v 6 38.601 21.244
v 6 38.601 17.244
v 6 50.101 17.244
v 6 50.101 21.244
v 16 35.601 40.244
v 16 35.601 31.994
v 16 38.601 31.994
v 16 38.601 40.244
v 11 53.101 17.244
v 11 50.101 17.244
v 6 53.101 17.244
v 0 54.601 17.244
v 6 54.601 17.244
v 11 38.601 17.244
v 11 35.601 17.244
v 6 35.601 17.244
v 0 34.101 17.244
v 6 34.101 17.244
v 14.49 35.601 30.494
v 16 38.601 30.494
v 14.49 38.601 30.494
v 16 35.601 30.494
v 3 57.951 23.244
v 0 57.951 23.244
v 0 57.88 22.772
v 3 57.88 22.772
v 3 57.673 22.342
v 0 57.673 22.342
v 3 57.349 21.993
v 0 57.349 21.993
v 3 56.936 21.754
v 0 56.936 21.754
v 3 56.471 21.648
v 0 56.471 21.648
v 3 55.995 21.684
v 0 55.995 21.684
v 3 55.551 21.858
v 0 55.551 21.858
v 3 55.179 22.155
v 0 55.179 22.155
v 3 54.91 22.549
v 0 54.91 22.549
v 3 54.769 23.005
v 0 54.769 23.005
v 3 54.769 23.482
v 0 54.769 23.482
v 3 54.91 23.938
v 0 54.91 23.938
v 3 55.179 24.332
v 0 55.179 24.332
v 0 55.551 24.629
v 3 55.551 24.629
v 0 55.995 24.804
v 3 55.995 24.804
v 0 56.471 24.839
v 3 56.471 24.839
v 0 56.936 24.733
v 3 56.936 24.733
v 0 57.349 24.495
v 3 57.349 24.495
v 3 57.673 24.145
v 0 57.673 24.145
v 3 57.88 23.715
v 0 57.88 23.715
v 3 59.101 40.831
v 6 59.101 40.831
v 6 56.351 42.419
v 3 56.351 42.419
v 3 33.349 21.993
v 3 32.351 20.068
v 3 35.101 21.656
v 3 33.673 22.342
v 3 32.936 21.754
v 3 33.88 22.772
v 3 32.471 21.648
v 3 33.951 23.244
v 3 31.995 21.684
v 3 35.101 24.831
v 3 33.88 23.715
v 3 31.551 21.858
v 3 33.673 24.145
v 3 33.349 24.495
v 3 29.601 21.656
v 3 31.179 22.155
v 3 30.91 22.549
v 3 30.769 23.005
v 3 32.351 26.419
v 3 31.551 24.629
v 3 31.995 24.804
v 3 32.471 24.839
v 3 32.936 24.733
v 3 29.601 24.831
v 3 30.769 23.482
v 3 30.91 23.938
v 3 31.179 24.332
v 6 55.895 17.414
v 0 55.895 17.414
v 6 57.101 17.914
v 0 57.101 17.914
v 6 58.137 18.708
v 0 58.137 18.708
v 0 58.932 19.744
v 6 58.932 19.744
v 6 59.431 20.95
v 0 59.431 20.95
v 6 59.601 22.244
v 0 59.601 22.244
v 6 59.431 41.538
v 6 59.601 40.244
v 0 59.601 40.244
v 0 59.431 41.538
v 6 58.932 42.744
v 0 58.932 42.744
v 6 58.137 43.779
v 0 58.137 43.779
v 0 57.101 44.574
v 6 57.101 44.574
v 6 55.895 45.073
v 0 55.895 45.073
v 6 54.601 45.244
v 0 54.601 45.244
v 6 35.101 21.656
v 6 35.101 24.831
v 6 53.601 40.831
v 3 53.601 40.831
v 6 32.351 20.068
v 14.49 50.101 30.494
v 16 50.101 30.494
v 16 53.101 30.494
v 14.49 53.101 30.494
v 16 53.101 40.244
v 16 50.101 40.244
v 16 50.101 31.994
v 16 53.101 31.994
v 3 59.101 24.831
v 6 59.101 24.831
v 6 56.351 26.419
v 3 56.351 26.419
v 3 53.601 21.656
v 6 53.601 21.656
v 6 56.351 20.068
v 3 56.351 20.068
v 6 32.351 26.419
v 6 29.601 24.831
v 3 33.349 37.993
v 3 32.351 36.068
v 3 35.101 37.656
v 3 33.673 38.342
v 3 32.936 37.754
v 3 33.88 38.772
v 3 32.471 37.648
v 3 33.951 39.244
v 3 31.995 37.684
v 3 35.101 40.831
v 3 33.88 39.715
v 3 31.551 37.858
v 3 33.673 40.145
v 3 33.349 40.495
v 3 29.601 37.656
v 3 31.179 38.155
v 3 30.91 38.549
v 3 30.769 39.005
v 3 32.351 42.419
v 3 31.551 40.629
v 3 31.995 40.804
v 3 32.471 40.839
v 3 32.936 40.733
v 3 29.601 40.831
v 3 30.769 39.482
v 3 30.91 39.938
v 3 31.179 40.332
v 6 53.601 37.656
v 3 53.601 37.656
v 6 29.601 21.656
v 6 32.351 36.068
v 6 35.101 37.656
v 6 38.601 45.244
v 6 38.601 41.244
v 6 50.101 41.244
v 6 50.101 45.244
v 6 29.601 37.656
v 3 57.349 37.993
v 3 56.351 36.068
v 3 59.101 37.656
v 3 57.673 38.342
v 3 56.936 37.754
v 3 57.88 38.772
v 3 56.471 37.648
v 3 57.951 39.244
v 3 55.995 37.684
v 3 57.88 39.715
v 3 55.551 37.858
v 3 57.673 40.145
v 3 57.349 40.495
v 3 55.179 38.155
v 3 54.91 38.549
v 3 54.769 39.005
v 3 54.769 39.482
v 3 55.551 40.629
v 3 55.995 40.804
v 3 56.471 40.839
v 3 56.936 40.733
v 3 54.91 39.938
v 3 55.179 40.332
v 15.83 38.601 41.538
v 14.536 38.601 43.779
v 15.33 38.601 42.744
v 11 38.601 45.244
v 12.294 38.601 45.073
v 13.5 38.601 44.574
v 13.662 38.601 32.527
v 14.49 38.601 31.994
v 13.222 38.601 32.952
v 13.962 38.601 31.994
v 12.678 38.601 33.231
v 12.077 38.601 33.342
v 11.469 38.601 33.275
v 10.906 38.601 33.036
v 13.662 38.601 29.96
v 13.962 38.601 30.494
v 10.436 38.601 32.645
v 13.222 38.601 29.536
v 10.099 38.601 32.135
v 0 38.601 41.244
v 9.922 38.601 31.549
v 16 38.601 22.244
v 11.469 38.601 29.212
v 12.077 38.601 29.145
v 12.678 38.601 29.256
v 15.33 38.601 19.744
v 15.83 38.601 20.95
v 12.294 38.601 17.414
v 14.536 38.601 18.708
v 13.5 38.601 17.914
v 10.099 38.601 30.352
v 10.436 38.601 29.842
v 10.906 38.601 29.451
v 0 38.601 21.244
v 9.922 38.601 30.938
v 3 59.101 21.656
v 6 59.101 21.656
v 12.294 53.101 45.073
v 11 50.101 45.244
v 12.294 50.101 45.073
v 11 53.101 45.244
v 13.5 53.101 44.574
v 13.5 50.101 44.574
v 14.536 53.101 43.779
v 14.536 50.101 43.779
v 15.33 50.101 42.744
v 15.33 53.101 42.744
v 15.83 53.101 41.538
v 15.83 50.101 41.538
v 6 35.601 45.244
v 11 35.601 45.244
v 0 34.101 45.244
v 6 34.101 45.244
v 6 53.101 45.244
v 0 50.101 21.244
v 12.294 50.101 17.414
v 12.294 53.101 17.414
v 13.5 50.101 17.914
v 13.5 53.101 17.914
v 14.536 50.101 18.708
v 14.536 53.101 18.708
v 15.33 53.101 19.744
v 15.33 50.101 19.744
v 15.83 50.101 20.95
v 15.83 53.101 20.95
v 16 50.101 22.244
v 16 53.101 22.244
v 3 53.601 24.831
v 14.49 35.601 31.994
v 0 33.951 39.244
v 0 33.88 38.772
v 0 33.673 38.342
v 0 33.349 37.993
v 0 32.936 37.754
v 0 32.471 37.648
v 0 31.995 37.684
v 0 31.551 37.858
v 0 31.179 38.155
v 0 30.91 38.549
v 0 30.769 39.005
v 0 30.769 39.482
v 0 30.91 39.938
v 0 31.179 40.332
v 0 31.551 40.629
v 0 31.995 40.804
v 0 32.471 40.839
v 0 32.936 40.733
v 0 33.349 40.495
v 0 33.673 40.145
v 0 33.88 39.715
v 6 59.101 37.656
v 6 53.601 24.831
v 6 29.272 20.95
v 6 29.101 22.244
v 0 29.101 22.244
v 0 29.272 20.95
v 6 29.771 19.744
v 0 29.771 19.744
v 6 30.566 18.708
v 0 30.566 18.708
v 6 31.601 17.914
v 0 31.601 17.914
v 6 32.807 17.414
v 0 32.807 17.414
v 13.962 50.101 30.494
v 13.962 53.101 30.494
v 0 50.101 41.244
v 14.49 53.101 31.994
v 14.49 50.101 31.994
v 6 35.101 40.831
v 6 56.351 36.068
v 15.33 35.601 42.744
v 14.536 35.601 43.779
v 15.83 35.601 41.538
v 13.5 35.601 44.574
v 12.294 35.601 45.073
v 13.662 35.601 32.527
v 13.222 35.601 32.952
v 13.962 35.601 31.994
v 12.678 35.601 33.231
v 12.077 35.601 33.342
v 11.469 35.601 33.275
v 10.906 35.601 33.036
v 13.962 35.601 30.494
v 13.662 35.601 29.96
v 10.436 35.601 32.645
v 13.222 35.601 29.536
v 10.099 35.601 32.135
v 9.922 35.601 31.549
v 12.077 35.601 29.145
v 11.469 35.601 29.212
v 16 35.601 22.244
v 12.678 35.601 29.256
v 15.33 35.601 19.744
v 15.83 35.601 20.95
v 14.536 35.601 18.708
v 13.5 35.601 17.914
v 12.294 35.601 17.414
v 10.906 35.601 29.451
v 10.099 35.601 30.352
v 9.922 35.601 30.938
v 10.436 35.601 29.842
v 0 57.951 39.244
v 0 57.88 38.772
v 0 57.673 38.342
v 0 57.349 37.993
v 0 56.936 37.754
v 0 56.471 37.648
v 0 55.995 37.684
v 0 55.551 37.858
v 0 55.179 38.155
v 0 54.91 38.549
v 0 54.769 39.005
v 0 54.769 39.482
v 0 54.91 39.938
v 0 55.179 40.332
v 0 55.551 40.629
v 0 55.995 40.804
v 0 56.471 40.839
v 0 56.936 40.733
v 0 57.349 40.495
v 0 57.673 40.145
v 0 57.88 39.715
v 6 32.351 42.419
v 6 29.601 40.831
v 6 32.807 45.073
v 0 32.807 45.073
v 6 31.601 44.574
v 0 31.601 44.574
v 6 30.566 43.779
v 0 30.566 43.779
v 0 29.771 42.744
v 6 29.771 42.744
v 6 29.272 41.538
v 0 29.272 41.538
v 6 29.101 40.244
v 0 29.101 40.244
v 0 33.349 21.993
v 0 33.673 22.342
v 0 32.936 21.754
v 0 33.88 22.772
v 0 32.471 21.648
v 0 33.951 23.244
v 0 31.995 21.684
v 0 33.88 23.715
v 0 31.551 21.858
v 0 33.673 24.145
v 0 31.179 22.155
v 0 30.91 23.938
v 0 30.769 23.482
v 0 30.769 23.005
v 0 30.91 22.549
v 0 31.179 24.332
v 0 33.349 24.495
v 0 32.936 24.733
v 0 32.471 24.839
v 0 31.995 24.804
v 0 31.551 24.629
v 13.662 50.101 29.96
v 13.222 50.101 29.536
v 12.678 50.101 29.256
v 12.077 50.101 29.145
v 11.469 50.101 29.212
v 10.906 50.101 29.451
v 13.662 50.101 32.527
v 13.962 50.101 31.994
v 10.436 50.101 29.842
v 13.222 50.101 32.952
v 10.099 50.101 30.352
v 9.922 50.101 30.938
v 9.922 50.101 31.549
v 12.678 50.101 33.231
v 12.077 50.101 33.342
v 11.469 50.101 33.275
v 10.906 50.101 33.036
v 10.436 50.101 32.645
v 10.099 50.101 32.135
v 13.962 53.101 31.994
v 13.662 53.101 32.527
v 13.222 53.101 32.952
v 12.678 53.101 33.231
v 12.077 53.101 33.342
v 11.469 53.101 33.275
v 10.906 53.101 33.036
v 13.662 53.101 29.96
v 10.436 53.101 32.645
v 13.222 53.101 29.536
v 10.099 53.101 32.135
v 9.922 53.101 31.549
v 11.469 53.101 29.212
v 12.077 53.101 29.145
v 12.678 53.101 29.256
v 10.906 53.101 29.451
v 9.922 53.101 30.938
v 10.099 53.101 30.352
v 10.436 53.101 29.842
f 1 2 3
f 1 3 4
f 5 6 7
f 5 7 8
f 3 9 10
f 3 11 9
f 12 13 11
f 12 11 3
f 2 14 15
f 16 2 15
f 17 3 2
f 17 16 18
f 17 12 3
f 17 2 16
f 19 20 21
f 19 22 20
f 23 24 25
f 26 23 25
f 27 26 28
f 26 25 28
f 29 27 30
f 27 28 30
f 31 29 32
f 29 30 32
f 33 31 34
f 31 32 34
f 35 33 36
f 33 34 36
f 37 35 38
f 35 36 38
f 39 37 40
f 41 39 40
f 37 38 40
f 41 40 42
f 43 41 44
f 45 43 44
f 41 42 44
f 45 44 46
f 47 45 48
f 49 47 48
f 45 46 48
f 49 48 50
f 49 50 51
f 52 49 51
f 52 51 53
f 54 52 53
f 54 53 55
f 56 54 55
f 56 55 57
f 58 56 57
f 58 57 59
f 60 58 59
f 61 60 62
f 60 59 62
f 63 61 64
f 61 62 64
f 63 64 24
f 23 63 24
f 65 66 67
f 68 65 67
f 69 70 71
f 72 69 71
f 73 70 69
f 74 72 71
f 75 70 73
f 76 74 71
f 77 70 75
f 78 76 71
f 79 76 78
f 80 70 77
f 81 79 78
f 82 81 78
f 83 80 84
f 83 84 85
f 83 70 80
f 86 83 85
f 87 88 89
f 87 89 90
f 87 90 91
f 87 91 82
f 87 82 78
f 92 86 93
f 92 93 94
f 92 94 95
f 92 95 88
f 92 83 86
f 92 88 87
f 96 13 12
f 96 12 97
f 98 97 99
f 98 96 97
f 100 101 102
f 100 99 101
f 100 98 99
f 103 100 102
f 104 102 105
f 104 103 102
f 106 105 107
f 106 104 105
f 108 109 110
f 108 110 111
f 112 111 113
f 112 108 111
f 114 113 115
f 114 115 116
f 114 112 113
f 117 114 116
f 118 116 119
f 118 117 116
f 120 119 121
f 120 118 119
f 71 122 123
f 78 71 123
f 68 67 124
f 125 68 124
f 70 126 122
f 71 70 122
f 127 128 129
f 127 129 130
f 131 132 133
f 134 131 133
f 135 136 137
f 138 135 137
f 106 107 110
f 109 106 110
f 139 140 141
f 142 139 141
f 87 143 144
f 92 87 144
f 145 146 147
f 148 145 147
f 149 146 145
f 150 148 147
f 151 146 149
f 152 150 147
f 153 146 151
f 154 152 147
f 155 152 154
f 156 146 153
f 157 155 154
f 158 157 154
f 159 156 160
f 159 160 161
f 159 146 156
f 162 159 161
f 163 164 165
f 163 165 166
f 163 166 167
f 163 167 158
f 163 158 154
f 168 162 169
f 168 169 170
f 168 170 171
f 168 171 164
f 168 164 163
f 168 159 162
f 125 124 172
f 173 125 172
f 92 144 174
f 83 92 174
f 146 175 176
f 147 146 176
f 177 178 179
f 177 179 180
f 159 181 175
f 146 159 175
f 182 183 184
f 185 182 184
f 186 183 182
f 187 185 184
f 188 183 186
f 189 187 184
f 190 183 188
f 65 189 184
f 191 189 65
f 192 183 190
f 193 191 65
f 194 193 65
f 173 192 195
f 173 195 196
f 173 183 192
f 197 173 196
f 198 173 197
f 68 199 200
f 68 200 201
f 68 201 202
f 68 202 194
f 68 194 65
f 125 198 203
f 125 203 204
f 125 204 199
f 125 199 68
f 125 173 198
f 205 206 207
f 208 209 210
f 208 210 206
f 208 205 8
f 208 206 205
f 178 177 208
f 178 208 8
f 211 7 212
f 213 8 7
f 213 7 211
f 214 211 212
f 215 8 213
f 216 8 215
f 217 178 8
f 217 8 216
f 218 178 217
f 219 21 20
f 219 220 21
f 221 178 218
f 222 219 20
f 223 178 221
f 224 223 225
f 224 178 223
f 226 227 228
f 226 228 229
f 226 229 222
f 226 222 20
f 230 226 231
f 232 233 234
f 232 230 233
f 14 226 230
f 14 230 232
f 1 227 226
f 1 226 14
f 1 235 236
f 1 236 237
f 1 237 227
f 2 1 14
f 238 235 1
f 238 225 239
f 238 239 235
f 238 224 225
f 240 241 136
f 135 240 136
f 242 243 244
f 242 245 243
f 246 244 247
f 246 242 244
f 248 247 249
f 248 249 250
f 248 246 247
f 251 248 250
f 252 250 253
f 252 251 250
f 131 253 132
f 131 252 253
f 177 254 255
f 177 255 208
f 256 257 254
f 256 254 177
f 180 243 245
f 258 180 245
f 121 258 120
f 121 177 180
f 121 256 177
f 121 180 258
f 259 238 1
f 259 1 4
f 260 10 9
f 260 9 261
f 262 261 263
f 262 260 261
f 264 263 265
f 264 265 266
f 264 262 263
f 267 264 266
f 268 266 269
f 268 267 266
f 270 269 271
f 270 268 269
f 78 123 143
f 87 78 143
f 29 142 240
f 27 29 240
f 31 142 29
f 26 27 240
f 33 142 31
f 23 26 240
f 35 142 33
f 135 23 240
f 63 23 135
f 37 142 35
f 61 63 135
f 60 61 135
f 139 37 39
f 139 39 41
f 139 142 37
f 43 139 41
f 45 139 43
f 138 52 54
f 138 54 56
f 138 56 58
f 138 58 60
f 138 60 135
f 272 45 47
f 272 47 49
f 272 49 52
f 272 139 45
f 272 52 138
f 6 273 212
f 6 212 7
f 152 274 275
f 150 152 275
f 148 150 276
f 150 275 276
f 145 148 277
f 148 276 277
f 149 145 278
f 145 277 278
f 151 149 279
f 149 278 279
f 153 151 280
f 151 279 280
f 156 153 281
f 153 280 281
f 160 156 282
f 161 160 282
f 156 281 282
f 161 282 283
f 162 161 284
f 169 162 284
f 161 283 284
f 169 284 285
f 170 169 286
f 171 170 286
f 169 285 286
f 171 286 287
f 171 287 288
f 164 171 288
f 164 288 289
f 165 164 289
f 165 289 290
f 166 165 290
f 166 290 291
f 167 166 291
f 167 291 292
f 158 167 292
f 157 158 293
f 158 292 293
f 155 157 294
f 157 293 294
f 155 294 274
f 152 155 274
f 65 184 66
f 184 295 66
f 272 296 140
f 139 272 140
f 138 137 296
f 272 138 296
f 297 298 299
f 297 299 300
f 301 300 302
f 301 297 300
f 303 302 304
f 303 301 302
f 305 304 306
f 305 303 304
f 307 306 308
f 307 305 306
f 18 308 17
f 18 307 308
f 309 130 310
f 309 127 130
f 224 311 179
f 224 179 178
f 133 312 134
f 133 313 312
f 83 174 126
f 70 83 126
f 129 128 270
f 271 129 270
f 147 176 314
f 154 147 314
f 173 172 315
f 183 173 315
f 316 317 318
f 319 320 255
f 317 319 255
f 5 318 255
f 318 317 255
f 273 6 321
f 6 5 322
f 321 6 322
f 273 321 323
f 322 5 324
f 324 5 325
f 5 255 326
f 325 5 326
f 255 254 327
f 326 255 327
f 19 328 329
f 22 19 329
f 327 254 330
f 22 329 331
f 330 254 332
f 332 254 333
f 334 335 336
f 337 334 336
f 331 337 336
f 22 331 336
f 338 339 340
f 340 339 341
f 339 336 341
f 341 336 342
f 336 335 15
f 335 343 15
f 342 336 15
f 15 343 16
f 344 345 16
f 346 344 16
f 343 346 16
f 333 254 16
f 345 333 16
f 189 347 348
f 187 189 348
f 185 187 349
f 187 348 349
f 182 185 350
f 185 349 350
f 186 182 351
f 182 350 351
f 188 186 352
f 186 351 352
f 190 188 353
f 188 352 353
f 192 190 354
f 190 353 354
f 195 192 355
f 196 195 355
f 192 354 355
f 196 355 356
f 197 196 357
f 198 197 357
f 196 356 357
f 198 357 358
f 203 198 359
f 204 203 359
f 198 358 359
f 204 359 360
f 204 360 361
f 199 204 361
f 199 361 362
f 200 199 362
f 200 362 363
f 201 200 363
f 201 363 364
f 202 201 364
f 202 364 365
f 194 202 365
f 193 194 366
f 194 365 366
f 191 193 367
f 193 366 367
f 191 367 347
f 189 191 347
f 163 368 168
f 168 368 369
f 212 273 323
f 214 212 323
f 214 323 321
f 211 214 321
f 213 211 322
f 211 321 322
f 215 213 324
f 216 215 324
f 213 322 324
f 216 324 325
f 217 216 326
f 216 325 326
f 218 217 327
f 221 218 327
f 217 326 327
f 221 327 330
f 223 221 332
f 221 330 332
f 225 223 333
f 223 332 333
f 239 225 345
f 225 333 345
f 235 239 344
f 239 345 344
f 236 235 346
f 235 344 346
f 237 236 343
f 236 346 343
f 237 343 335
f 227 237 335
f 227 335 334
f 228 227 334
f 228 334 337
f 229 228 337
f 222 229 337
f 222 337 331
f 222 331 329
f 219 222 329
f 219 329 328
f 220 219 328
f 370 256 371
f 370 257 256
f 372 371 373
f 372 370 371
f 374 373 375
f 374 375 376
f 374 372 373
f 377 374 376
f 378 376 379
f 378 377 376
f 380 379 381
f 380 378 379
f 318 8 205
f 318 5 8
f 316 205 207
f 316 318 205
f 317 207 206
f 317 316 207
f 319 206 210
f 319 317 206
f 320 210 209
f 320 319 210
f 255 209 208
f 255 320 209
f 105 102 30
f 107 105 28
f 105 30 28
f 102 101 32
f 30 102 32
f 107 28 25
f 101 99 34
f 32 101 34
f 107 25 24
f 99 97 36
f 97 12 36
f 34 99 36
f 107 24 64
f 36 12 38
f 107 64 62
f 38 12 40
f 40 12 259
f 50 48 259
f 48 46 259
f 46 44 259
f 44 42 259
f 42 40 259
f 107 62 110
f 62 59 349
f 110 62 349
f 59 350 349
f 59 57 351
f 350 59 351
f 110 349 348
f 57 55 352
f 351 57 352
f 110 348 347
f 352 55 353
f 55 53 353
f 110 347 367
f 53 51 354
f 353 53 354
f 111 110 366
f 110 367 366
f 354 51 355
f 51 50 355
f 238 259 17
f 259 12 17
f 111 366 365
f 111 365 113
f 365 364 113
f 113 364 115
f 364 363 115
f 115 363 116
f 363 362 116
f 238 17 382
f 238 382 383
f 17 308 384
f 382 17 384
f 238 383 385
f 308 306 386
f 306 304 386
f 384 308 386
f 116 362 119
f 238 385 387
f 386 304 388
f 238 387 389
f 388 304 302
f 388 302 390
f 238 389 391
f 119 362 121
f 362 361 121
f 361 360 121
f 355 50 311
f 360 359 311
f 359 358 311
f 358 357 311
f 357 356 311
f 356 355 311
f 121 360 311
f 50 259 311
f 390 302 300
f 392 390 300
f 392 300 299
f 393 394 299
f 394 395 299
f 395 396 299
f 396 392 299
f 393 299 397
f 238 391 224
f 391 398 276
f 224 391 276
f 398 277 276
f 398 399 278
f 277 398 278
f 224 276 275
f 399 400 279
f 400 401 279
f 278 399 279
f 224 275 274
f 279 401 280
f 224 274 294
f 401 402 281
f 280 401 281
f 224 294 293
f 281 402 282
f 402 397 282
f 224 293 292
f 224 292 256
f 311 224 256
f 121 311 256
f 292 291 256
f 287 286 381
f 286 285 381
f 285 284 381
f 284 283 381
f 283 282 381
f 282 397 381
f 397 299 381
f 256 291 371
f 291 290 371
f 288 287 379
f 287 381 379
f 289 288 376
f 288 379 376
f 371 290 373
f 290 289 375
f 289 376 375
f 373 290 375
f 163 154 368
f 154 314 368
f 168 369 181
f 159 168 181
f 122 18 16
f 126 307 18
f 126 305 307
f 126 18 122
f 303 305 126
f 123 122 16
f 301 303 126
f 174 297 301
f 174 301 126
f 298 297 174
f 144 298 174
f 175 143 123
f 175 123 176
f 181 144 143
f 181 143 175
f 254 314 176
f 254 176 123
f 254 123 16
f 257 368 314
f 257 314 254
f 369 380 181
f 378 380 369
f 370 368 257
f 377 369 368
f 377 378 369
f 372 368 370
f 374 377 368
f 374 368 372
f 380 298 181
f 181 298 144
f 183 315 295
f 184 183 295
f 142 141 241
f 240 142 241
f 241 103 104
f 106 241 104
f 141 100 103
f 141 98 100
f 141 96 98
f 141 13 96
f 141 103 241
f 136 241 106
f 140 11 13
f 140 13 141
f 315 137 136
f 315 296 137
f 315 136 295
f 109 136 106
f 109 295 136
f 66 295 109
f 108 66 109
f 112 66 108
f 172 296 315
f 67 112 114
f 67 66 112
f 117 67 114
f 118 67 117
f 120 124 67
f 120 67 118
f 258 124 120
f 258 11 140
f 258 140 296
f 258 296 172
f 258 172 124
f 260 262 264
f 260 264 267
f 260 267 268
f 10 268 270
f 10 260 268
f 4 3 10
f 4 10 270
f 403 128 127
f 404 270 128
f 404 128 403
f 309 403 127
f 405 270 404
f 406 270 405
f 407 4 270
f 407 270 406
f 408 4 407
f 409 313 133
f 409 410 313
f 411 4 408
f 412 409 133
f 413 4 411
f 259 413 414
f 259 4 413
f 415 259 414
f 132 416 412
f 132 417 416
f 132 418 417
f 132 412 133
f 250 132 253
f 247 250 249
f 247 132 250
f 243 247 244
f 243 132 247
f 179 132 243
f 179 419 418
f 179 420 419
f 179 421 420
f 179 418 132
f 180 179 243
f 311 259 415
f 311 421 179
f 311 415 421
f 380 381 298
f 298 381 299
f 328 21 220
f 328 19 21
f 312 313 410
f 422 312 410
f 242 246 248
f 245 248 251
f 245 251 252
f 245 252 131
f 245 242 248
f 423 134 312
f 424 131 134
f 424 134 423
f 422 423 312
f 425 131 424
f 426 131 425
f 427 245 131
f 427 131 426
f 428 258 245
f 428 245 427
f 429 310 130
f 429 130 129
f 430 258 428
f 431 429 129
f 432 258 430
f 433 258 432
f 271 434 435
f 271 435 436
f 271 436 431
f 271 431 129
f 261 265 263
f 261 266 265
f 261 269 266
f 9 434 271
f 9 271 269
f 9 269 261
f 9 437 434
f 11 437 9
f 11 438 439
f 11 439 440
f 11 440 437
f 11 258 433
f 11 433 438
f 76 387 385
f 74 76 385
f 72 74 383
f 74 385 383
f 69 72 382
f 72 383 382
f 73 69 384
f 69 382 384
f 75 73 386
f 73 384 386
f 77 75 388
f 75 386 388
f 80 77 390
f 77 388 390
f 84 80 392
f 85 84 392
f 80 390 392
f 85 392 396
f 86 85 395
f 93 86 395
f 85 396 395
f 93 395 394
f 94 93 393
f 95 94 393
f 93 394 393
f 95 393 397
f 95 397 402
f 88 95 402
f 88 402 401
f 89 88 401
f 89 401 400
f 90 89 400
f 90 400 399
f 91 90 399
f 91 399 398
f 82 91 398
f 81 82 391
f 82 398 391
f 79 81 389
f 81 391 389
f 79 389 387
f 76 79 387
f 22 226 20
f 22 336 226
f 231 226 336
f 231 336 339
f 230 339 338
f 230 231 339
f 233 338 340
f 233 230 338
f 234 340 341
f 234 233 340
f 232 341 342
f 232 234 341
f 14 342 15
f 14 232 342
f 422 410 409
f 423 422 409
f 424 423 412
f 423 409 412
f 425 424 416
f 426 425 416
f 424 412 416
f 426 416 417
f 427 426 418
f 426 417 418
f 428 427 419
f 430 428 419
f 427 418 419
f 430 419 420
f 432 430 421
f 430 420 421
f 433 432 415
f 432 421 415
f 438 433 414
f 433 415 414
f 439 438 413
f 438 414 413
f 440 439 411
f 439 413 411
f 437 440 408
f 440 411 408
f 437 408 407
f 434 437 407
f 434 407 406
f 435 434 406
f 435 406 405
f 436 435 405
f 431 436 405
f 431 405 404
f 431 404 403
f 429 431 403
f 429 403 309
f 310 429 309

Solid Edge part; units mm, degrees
sketch "Sketch1" plane through (0, 0, 0) normal (1, 0, 0) x (0, 1, 0)
  circle A0 centre (32.3514, 23.2437) radius 1.6
  circle A1 centre (56.3514, 23.2437) radius 1.6
  circle A2 centre (56.3514, 39.2437) radius 1.6
  line L0 (59.6014, 17.2437) -> (59.6014, 45.2437)
  line L1 (29.1014, 45.2437) -> (59.6014, 45.2437)
  line L2 (29.1014, 45.2437) -> (29.1014, 17.2437)
  line L3 (59.6014, 17.2437) -> (29.1014, 17.2437)
  line L4 (38.6014, 21.2437) -> (50.1014, 21.2437)
  line L5 (50.1014, 21.2437) -> (50.1014, 41.2437)
  line L6 (50.1014, 41.2437) -> (38.6014, 41.2437)
  line L7 (38.6014, 41.2437) -> (38.6014, 21.2437)
  circle A3 centre (32.3514, 39.2437) radius 1.6
  dimension "D1" = 9.5
  dimension "D2" = 9.5
extrude "Protrusion1" add sketch "Sketch1" along normal blind 6
sketch "Sketch2" plane through (6, 44.3514, 31.2437) normal (1, 0, 0) x (0, 1, 0)
  line L0 (-5.75, 14) -> (-8.75, 14)
  line L1 (-8.75, 14) -> (-8.75, -14)
  line L2 (-8.75, -14) -> (-5.75, -14)
  line L3 (-5.75, 14) -> (-5.75, -14)
  line L4 (5.75, 14) -> (8.75, 14)
  line L5 (8.75, 14) -> (8.75, -14)
  line L6 (8.75, -14) -> (5.75, -14)
  line L7 (5.75, -14) -> (5.75, 14)
  dimension "D1" = 28
  dimension "D2" = 28
  dimension "D3" = 6.5
  dimension "D4" = 6.5
extrude "ExtrudedProtrusion_2" add sketch "Sketch2" along normal blind 10
sketch "Sketch3" plane through (6, 44.3514, 31.2437) normal (1, 0, 0) x (0, 1, 0)
  line L0 (-9.25, 9.5877) -> (-12, 11.1754)
  line L1 (-12, 11.1754) -> (-14.75, 9.5877)
  line L2 (-14.75, 9.5877) -> (-14.75, 6.4123)
  line L3 (-14.75, 6.4123) -> (-12, 4.8246)
  line L4 (-12, 4.8246) -> (-9.25, 6.4123)
  line L5 (-9.25, 6.4123) -> (-9.25, 9.5877)
  line L6 (-9.25, -6.4123) -> (-12, -4.8246)
  line L7 (-12, -4.8246) -> (-14.75, -6.4123)
  line L8 (-14.75, -6.4123) -> (-14.75, -9.5877)
  line L9 (-14.75, -9.5877) -> (-12, -11.1754)
  line L10 (-12, -11.1754) -> (-9.25, -9.5877)
  line L11 (-9.25, -9.5877) -> (-9.25, -6.4123)
  line L12 (14.75, 9.5877) -> (12, 11.1754)
  line L13 (12, 11.1754) -> (9.25, 9.5877)
  line L14 (9.25, 9.5877) -> (9.25, 6.4123)
  line L15 (9.25, 6.4123) -> (12, 4.8246)
  line L16 (12, 4.8246) -> (14.75, 6.4123)
  line L17 (14.75, 6.4123) -> (14.75, 9.5877)
  line L18 (14.75, -6.4123) -> (12, -4.8246)
  line L19 (12, -4.8246) -> (9.25, -6.4123)
  line L20 (9.25, -6.4123) -> (9.25, -9.5877)
  line L21 (9.25, -9.5877) -> (12, -11.1754)
  line L22 (12, -11.1754) -> (14.75, -9.5877)
  line L23 (14.75, -9.5877) -> (14.75, -6.4123)
extrude "ExtrudedCutout_1" cut sketch "Sketch3" against normal blind 3
sketch "Sketch4" plane through (11, 35.6014, 31.2437) normal (0, -1, 0) x (1, 0, 0)
  line L0 (3.4895, 0.75) -> (7.5, 0.75)
  line L1 (7.5, 0.75) -> (7.5, -0.75)
  line L2 (7.5, -0.75) -> (3.4895, -0.75)
  line L3 (3.4895, -0.75) -> (2.9615, -0.75)
  line L4 (3.4895, 0.75) -> (2.9615, 0.75)
  arc A0 (2.9615, 0.75) -> (2.9615, -0.75) centre (1, 0) ccw
extrude "ExtrudedCutout_2" cut sketch "Sketch4" against normal blind 20
fillet "Round_1" radius 5 8 edges at (16, 37.1014, 45.2437) (16, 51.6014, 45.2437) (16, 37.1014, 17.2437) (16, 51.6014, 17.2437) (3, 29.1014, 17.2437) (3, 29.1014, 45.2437) (3, 59.6014, 45.2437) (3, 59.6014, 17.2437)
